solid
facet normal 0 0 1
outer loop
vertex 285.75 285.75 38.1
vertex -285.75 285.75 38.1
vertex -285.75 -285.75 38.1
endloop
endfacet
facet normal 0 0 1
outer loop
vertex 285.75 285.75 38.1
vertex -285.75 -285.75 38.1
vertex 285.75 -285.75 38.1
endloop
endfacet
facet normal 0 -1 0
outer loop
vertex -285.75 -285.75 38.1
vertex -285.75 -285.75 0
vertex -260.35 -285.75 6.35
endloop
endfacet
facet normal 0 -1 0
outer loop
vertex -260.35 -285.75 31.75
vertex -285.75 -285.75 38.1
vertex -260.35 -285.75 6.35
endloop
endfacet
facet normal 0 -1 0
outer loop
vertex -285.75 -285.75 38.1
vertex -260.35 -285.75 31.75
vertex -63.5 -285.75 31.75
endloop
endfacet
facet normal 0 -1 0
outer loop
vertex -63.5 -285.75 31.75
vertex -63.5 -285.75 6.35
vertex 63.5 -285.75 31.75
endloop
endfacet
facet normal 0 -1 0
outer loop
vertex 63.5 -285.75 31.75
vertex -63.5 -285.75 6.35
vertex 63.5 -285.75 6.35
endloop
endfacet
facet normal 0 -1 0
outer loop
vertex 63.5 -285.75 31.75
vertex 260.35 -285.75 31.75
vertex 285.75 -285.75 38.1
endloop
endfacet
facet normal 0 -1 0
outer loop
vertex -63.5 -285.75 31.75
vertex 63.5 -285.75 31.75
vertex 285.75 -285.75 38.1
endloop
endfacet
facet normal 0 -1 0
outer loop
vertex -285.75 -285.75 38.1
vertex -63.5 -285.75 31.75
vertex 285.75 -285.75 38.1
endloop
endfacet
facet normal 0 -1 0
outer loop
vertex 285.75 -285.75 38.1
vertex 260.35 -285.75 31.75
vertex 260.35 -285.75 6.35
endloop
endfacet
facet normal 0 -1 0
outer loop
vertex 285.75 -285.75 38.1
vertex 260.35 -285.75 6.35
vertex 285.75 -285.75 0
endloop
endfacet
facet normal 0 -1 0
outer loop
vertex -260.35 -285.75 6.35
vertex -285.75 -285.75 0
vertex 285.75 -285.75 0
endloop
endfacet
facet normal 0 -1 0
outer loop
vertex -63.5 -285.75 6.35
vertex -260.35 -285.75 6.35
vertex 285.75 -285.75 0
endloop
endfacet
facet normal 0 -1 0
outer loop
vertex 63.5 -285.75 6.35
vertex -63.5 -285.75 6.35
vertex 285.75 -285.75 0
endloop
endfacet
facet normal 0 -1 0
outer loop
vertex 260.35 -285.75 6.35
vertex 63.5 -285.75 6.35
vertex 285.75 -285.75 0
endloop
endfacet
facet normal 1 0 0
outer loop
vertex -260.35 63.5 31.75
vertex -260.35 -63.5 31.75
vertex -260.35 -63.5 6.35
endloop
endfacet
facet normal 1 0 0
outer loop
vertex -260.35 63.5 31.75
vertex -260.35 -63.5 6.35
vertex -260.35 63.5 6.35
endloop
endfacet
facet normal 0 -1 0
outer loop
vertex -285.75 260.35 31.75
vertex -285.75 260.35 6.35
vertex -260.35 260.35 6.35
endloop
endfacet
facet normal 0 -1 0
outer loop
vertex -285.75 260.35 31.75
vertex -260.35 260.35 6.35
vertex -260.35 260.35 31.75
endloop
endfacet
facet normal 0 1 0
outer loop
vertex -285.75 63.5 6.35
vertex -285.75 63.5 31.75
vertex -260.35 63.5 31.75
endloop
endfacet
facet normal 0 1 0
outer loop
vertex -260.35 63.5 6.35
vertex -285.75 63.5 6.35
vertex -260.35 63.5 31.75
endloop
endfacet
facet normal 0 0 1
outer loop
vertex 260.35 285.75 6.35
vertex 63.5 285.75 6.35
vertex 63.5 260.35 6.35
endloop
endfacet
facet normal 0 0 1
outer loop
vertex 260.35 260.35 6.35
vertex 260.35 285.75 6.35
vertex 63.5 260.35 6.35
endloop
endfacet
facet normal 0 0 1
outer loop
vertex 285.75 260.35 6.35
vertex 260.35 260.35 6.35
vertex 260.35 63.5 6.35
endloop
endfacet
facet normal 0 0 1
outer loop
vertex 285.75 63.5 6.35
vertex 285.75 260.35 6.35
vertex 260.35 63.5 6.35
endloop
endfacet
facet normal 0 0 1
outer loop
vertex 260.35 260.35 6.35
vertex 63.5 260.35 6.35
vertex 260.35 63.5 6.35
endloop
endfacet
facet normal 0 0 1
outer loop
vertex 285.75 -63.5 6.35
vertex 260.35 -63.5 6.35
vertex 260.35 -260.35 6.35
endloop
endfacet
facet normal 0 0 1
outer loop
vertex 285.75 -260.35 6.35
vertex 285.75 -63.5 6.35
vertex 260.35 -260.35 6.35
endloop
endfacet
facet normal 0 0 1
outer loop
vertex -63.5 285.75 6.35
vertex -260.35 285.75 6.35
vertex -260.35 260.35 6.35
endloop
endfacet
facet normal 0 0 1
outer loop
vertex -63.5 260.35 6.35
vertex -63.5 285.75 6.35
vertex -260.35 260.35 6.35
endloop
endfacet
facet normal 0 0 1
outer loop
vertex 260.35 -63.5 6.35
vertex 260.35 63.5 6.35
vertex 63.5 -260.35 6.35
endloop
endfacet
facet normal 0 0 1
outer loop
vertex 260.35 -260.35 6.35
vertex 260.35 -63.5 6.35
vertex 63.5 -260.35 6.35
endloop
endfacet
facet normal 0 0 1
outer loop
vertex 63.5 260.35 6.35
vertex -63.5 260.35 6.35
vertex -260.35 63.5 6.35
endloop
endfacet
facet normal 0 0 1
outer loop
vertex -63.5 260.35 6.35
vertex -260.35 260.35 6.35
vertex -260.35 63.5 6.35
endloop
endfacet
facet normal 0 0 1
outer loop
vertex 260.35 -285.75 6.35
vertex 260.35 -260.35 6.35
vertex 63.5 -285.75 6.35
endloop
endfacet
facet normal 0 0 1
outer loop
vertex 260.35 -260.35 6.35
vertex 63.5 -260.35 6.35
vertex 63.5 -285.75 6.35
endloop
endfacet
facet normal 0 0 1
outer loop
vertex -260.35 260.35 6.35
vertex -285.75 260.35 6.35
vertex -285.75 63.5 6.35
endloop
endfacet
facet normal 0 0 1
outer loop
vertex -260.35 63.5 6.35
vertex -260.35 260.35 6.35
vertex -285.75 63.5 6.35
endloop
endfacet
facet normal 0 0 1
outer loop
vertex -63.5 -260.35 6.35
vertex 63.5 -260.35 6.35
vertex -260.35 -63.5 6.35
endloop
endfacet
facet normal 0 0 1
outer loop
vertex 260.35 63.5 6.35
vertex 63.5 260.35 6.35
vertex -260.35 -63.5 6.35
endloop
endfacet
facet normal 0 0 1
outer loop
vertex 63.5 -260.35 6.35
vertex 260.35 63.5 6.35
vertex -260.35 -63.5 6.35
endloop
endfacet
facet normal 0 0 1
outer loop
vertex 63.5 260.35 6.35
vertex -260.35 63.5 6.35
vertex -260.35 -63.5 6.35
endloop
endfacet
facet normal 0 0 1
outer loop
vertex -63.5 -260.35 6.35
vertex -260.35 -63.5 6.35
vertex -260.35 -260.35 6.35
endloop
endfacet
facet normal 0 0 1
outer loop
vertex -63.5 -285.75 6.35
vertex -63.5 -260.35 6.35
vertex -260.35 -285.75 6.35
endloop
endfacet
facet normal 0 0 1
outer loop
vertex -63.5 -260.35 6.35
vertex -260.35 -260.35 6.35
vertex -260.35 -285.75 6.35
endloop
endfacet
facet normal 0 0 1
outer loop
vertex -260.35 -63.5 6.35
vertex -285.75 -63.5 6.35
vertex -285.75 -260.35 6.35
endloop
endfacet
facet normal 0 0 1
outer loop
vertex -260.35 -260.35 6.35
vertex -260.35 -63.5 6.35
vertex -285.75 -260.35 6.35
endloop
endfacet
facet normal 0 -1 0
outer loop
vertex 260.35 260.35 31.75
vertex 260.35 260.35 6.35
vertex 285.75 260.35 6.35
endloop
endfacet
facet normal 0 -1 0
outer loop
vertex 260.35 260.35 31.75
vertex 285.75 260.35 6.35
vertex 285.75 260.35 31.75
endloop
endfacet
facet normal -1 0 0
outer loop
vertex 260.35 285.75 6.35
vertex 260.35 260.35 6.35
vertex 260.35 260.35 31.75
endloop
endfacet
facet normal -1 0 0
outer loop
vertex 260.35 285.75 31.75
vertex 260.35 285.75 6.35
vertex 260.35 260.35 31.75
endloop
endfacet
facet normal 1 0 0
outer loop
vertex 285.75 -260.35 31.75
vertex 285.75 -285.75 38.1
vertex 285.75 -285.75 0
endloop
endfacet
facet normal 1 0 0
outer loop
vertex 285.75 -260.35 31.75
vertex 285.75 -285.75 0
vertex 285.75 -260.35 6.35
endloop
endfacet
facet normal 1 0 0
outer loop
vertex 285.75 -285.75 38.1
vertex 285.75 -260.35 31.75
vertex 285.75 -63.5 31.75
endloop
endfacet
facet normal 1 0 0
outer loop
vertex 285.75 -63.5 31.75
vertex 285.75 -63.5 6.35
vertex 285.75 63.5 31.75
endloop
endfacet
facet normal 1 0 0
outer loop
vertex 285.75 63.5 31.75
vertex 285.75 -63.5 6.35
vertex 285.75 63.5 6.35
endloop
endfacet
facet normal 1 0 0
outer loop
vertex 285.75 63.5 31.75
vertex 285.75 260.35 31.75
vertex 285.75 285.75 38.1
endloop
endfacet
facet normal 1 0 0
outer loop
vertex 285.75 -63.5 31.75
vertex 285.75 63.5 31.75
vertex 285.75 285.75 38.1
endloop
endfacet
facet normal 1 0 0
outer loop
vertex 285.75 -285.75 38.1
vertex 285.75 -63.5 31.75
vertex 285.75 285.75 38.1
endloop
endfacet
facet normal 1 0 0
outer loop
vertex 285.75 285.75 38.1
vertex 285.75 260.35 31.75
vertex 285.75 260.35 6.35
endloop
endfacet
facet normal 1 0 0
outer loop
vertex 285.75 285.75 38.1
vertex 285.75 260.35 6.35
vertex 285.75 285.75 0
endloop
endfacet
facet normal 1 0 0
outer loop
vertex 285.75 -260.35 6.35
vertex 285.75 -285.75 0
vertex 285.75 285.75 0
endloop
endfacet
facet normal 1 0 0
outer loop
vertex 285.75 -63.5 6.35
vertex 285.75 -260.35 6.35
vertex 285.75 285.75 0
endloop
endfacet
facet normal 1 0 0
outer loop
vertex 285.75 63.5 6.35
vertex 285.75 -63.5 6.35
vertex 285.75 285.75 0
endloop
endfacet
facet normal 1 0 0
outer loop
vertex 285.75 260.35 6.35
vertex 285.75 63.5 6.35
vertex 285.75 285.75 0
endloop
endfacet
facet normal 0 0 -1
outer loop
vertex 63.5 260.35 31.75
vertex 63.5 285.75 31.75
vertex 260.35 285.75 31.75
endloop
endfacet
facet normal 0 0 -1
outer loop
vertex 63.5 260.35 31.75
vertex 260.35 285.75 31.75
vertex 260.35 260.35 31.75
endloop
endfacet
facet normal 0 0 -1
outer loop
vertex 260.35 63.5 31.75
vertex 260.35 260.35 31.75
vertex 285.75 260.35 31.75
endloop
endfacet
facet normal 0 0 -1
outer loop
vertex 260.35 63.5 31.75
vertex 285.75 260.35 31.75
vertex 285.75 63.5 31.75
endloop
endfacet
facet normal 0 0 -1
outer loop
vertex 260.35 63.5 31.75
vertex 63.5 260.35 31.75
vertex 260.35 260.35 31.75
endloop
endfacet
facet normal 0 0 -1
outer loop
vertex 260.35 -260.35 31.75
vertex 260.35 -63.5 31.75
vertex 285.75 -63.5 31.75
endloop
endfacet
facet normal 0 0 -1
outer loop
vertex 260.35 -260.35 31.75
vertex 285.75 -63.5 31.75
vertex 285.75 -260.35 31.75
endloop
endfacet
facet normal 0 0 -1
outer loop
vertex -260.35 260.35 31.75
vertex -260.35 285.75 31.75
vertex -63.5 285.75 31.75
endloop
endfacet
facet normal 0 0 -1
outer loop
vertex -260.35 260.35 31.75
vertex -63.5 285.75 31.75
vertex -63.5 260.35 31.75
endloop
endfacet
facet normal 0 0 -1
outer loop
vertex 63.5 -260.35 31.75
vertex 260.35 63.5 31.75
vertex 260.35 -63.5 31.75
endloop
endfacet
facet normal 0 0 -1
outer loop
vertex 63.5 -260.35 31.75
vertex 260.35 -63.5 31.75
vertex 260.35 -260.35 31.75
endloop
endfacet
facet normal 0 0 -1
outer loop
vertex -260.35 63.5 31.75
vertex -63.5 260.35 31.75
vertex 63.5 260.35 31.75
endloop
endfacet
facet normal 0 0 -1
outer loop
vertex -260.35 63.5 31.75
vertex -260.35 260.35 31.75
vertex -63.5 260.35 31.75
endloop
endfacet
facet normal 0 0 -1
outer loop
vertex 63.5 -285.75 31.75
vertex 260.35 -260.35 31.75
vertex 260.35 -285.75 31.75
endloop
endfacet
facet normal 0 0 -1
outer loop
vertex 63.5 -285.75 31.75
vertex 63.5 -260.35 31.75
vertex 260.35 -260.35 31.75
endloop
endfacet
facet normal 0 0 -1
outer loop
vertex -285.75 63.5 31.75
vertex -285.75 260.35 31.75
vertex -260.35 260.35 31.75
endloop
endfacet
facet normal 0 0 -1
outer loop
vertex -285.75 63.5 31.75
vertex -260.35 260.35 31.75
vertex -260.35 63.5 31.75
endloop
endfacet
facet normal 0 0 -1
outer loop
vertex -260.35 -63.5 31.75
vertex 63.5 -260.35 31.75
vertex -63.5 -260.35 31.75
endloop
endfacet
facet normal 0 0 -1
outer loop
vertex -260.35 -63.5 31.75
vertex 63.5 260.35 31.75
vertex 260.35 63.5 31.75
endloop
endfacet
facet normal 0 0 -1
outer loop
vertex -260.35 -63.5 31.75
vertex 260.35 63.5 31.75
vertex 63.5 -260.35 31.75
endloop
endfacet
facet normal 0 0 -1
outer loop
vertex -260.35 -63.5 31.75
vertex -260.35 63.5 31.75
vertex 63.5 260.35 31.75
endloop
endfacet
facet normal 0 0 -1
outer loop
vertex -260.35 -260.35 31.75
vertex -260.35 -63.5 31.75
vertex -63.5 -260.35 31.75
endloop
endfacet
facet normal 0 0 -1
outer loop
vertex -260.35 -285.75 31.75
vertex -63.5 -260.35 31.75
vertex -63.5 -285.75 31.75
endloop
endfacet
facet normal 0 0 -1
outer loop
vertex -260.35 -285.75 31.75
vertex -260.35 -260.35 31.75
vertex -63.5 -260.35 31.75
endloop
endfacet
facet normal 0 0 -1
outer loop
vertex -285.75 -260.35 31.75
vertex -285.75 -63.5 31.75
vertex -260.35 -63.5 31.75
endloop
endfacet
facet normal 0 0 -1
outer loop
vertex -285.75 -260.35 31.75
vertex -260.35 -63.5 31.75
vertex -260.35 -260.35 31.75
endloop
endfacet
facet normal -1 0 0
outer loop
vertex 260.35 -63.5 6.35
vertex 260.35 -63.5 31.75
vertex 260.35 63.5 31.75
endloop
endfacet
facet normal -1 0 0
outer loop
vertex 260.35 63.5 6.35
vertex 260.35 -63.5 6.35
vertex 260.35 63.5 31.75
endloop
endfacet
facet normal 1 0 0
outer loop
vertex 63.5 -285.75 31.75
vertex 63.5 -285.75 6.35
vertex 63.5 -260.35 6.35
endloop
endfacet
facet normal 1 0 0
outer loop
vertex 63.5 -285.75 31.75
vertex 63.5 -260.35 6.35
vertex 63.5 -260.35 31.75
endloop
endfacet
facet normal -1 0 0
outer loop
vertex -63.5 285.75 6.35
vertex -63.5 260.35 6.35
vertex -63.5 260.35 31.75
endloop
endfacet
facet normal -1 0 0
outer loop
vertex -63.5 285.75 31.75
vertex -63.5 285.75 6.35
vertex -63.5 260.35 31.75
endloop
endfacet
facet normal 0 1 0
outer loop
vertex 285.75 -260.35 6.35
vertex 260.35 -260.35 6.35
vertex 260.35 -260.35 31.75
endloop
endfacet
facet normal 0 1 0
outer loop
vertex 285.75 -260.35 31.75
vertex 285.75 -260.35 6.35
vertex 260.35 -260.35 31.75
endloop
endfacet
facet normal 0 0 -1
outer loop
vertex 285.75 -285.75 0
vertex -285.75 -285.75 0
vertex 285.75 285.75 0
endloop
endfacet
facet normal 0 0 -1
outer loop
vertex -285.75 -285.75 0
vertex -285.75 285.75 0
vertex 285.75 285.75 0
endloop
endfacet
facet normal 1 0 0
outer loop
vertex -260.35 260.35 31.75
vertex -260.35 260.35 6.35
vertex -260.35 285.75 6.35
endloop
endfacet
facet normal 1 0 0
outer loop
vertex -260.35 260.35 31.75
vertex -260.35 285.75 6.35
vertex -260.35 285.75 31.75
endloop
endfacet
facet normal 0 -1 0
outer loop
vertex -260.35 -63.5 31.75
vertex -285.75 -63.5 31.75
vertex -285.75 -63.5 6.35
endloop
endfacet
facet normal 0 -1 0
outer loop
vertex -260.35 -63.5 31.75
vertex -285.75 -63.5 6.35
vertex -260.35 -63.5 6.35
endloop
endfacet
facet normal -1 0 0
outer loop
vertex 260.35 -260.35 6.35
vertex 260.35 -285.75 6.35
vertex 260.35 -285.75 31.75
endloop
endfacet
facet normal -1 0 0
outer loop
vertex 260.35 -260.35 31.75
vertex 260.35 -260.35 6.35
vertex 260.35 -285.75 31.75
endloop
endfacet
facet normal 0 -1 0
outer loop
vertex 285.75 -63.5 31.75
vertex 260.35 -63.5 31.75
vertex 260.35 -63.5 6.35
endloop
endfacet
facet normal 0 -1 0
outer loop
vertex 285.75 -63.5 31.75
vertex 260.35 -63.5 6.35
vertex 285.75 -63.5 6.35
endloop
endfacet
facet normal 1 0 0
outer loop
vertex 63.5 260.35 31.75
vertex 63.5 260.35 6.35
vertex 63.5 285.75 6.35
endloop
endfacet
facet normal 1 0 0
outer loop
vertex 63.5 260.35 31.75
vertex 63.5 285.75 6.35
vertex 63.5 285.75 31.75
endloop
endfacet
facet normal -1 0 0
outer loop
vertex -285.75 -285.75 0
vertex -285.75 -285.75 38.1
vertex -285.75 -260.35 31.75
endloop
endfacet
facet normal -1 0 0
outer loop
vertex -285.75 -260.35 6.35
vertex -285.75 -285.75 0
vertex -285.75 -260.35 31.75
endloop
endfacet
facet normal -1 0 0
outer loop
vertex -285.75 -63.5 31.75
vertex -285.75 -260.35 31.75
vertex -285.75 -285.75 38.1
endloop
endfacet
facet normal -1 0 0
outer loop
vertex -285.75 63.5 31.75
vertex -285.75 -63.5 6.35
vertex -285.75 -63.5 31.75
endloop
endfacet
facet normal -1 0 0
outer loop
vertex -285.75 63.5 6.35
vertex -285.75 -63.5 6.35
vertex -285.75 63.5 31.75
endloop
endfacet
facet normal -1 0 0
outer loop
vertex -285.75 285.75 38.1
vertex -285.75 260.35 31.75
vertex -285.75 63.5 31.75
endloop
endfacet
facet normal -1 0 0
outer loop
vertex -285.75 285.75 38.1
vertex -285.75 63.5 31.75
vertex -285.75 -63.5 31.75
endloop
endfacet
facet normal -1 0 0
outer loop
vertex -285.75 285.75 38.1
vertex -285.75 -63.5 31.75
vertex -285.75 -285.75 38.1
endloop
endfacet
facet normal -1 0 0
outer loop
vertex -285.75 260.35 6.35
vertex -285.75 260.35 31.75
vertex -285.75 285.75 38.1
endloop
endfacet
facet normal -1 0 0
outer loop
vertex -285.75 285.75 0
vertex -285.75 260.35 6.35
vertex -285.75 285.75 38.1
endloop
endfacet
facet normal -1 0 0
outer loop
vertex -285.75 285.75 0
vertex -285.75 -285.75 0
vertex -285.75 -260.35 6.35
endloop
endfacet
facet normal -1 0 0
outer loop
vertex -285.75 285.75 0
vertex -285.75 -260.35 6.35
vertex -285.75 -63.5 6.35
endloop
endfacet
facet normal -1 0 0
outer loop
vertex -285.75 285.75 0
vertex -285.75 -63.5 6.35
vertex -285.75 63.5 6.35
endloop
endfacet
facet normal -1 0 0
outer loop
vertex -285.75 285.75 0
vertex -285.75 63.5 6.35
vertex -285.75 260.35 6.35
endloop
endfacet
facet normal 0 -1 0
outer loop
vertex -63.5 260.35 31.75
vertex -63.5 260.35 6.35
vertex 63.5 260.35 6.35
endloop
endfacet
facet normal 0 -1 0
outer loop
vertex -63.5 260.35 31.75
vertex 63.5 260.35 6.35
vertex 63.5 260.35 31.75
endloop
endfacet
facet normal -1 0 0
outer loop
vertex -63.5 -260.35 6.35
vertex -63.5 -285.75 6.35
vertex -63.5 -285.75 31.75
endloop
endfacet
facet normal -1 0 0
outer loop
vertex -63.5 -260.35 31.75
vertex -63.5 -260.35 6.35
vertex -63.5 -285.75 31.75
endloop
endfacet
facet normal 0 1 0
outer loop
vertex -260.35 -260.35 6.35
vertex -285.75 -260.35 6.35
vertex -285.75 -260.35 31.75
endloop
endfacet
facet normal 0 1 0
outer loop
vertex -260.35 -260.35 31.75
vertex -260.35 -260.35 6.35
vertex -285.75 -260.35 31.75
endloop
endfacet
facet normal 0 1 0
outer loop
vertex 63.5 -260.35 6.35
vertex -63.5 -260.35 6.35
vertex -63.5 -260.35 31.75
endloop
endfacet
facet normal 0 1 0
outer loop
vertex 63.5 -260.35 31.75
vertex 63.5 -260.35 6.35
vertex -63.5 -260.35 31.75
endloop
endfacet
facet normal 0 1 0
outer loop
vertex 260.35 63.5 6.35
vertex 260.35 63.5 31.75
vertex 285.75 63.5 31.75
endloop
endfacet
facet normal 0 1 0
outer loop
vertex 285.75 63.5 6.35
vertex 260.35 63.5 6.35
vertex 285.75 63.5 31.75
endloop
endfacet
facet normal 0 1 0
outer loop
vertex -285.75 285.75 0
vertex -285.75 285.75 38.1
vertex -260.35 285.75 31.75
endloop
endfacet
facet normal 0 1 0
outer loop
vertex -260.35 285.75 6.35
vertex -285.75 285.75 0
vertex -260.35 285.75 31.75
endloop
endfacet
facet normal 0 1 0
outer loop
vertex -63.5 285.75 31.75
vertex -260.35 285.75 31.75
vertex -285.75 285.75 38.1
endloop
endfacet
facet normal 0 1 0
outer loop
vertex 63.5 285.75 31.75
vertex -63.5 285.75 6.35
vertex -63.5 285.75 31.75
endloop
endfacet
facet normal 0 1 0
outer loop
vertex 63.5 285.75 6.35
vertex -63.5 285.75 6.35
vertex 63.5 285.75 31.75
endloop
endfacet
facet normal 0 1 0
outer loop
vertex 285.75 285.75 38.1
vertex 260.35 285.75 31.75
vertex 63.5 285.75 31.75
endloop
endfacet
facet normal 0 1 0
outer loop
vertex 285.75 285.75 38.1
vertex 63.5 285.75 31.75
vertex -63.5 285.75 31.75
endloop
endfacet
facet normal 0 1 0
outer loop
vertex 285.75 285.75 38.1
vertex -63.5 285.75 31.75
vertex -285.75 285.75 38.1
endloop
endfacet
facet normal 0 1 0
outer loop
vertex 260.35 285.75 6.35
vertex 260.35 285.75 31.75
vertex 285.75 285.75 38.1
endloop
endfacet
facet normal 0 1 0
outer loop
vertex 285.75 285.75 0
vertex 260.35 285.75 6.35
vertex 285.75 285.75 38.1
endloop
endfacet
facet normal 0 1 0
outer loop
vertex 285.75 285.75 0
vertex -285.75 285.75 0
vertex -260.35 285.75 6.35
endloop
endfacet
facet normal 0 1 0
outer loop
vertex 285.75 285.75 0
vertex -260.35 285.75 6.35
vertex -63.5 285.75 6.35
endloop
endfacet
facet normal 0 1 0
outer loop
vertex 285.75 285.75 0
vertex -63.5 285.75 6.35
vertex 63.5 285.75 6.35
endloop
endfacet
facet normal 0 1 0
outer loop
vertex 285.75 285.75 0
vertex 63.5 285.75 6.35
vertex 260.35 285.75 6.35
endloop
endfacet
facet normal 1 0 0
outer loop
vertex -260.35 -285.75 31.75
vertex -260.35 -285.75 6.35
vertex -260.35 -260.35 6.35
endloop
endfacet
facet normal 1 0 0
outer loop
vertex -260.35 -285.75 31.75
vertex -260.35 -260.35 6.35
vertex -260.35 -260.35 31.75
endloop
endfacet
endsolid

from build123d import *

# Parameters (mm, degrees)
F0_W     = 571.5
F0_H     = 571.5
F1_DEPTH = 38.1
F2_W     = 196.85
F2_H     = 25.4
F3_DEPTH = 571.501
F4_W     = 520.7
F4_H     = 25.4
F5_DEPTH = 571.501
F6_W     = 25.4
F6_H     = 127
F7_DEPTH = 38.1


with BuildPart() as f1:
    # F0 (on Top) → F1 (new body)
    with BuildSketch(Plane.XY):
        Rectangle(F0_W, F0_H)
    extrude(amount=F1_DEPTH)

    # F2 (on face) → F3 (cut, through all)
    with BuildSketch(Plane.XZ.offset(285.75)):
        with Locations((-161.925, 19.05)):
            Rectangle(F2_W, F2_H)
        with Locations((161.925, 19.05)):
            Rectangle(F2_W, F2_H)
    extrude(amount=-F3_DEPTH, mode=Mode.SUBTRACT)

    # F4 (on face) → F5 (cut, through all)
    with BuildSketch(Plane(origin=(-285.75, 0, 0), x_dir=(0, -1, 0), z_dir=(-1, 0, 0))):
        with Locations((0, 19.05)):
            Rectangle(F4_W, F4_H)
    extrude(amount=-F5_DEPTH, mode=Mode.SUBTRACT)

    # F6 (on face) → F7 (join)
    with BuildSketch(Plane.XY.offset(38.1)):
        with Locations((-273.05, 0)):
            Rectangle(F6_W, F6_H)
        with Locations((273.05, 0)):
            Rectangle(F6_W, F6_H)
    extrude(amount=-F7_DEPTH)


solid = f1.part
